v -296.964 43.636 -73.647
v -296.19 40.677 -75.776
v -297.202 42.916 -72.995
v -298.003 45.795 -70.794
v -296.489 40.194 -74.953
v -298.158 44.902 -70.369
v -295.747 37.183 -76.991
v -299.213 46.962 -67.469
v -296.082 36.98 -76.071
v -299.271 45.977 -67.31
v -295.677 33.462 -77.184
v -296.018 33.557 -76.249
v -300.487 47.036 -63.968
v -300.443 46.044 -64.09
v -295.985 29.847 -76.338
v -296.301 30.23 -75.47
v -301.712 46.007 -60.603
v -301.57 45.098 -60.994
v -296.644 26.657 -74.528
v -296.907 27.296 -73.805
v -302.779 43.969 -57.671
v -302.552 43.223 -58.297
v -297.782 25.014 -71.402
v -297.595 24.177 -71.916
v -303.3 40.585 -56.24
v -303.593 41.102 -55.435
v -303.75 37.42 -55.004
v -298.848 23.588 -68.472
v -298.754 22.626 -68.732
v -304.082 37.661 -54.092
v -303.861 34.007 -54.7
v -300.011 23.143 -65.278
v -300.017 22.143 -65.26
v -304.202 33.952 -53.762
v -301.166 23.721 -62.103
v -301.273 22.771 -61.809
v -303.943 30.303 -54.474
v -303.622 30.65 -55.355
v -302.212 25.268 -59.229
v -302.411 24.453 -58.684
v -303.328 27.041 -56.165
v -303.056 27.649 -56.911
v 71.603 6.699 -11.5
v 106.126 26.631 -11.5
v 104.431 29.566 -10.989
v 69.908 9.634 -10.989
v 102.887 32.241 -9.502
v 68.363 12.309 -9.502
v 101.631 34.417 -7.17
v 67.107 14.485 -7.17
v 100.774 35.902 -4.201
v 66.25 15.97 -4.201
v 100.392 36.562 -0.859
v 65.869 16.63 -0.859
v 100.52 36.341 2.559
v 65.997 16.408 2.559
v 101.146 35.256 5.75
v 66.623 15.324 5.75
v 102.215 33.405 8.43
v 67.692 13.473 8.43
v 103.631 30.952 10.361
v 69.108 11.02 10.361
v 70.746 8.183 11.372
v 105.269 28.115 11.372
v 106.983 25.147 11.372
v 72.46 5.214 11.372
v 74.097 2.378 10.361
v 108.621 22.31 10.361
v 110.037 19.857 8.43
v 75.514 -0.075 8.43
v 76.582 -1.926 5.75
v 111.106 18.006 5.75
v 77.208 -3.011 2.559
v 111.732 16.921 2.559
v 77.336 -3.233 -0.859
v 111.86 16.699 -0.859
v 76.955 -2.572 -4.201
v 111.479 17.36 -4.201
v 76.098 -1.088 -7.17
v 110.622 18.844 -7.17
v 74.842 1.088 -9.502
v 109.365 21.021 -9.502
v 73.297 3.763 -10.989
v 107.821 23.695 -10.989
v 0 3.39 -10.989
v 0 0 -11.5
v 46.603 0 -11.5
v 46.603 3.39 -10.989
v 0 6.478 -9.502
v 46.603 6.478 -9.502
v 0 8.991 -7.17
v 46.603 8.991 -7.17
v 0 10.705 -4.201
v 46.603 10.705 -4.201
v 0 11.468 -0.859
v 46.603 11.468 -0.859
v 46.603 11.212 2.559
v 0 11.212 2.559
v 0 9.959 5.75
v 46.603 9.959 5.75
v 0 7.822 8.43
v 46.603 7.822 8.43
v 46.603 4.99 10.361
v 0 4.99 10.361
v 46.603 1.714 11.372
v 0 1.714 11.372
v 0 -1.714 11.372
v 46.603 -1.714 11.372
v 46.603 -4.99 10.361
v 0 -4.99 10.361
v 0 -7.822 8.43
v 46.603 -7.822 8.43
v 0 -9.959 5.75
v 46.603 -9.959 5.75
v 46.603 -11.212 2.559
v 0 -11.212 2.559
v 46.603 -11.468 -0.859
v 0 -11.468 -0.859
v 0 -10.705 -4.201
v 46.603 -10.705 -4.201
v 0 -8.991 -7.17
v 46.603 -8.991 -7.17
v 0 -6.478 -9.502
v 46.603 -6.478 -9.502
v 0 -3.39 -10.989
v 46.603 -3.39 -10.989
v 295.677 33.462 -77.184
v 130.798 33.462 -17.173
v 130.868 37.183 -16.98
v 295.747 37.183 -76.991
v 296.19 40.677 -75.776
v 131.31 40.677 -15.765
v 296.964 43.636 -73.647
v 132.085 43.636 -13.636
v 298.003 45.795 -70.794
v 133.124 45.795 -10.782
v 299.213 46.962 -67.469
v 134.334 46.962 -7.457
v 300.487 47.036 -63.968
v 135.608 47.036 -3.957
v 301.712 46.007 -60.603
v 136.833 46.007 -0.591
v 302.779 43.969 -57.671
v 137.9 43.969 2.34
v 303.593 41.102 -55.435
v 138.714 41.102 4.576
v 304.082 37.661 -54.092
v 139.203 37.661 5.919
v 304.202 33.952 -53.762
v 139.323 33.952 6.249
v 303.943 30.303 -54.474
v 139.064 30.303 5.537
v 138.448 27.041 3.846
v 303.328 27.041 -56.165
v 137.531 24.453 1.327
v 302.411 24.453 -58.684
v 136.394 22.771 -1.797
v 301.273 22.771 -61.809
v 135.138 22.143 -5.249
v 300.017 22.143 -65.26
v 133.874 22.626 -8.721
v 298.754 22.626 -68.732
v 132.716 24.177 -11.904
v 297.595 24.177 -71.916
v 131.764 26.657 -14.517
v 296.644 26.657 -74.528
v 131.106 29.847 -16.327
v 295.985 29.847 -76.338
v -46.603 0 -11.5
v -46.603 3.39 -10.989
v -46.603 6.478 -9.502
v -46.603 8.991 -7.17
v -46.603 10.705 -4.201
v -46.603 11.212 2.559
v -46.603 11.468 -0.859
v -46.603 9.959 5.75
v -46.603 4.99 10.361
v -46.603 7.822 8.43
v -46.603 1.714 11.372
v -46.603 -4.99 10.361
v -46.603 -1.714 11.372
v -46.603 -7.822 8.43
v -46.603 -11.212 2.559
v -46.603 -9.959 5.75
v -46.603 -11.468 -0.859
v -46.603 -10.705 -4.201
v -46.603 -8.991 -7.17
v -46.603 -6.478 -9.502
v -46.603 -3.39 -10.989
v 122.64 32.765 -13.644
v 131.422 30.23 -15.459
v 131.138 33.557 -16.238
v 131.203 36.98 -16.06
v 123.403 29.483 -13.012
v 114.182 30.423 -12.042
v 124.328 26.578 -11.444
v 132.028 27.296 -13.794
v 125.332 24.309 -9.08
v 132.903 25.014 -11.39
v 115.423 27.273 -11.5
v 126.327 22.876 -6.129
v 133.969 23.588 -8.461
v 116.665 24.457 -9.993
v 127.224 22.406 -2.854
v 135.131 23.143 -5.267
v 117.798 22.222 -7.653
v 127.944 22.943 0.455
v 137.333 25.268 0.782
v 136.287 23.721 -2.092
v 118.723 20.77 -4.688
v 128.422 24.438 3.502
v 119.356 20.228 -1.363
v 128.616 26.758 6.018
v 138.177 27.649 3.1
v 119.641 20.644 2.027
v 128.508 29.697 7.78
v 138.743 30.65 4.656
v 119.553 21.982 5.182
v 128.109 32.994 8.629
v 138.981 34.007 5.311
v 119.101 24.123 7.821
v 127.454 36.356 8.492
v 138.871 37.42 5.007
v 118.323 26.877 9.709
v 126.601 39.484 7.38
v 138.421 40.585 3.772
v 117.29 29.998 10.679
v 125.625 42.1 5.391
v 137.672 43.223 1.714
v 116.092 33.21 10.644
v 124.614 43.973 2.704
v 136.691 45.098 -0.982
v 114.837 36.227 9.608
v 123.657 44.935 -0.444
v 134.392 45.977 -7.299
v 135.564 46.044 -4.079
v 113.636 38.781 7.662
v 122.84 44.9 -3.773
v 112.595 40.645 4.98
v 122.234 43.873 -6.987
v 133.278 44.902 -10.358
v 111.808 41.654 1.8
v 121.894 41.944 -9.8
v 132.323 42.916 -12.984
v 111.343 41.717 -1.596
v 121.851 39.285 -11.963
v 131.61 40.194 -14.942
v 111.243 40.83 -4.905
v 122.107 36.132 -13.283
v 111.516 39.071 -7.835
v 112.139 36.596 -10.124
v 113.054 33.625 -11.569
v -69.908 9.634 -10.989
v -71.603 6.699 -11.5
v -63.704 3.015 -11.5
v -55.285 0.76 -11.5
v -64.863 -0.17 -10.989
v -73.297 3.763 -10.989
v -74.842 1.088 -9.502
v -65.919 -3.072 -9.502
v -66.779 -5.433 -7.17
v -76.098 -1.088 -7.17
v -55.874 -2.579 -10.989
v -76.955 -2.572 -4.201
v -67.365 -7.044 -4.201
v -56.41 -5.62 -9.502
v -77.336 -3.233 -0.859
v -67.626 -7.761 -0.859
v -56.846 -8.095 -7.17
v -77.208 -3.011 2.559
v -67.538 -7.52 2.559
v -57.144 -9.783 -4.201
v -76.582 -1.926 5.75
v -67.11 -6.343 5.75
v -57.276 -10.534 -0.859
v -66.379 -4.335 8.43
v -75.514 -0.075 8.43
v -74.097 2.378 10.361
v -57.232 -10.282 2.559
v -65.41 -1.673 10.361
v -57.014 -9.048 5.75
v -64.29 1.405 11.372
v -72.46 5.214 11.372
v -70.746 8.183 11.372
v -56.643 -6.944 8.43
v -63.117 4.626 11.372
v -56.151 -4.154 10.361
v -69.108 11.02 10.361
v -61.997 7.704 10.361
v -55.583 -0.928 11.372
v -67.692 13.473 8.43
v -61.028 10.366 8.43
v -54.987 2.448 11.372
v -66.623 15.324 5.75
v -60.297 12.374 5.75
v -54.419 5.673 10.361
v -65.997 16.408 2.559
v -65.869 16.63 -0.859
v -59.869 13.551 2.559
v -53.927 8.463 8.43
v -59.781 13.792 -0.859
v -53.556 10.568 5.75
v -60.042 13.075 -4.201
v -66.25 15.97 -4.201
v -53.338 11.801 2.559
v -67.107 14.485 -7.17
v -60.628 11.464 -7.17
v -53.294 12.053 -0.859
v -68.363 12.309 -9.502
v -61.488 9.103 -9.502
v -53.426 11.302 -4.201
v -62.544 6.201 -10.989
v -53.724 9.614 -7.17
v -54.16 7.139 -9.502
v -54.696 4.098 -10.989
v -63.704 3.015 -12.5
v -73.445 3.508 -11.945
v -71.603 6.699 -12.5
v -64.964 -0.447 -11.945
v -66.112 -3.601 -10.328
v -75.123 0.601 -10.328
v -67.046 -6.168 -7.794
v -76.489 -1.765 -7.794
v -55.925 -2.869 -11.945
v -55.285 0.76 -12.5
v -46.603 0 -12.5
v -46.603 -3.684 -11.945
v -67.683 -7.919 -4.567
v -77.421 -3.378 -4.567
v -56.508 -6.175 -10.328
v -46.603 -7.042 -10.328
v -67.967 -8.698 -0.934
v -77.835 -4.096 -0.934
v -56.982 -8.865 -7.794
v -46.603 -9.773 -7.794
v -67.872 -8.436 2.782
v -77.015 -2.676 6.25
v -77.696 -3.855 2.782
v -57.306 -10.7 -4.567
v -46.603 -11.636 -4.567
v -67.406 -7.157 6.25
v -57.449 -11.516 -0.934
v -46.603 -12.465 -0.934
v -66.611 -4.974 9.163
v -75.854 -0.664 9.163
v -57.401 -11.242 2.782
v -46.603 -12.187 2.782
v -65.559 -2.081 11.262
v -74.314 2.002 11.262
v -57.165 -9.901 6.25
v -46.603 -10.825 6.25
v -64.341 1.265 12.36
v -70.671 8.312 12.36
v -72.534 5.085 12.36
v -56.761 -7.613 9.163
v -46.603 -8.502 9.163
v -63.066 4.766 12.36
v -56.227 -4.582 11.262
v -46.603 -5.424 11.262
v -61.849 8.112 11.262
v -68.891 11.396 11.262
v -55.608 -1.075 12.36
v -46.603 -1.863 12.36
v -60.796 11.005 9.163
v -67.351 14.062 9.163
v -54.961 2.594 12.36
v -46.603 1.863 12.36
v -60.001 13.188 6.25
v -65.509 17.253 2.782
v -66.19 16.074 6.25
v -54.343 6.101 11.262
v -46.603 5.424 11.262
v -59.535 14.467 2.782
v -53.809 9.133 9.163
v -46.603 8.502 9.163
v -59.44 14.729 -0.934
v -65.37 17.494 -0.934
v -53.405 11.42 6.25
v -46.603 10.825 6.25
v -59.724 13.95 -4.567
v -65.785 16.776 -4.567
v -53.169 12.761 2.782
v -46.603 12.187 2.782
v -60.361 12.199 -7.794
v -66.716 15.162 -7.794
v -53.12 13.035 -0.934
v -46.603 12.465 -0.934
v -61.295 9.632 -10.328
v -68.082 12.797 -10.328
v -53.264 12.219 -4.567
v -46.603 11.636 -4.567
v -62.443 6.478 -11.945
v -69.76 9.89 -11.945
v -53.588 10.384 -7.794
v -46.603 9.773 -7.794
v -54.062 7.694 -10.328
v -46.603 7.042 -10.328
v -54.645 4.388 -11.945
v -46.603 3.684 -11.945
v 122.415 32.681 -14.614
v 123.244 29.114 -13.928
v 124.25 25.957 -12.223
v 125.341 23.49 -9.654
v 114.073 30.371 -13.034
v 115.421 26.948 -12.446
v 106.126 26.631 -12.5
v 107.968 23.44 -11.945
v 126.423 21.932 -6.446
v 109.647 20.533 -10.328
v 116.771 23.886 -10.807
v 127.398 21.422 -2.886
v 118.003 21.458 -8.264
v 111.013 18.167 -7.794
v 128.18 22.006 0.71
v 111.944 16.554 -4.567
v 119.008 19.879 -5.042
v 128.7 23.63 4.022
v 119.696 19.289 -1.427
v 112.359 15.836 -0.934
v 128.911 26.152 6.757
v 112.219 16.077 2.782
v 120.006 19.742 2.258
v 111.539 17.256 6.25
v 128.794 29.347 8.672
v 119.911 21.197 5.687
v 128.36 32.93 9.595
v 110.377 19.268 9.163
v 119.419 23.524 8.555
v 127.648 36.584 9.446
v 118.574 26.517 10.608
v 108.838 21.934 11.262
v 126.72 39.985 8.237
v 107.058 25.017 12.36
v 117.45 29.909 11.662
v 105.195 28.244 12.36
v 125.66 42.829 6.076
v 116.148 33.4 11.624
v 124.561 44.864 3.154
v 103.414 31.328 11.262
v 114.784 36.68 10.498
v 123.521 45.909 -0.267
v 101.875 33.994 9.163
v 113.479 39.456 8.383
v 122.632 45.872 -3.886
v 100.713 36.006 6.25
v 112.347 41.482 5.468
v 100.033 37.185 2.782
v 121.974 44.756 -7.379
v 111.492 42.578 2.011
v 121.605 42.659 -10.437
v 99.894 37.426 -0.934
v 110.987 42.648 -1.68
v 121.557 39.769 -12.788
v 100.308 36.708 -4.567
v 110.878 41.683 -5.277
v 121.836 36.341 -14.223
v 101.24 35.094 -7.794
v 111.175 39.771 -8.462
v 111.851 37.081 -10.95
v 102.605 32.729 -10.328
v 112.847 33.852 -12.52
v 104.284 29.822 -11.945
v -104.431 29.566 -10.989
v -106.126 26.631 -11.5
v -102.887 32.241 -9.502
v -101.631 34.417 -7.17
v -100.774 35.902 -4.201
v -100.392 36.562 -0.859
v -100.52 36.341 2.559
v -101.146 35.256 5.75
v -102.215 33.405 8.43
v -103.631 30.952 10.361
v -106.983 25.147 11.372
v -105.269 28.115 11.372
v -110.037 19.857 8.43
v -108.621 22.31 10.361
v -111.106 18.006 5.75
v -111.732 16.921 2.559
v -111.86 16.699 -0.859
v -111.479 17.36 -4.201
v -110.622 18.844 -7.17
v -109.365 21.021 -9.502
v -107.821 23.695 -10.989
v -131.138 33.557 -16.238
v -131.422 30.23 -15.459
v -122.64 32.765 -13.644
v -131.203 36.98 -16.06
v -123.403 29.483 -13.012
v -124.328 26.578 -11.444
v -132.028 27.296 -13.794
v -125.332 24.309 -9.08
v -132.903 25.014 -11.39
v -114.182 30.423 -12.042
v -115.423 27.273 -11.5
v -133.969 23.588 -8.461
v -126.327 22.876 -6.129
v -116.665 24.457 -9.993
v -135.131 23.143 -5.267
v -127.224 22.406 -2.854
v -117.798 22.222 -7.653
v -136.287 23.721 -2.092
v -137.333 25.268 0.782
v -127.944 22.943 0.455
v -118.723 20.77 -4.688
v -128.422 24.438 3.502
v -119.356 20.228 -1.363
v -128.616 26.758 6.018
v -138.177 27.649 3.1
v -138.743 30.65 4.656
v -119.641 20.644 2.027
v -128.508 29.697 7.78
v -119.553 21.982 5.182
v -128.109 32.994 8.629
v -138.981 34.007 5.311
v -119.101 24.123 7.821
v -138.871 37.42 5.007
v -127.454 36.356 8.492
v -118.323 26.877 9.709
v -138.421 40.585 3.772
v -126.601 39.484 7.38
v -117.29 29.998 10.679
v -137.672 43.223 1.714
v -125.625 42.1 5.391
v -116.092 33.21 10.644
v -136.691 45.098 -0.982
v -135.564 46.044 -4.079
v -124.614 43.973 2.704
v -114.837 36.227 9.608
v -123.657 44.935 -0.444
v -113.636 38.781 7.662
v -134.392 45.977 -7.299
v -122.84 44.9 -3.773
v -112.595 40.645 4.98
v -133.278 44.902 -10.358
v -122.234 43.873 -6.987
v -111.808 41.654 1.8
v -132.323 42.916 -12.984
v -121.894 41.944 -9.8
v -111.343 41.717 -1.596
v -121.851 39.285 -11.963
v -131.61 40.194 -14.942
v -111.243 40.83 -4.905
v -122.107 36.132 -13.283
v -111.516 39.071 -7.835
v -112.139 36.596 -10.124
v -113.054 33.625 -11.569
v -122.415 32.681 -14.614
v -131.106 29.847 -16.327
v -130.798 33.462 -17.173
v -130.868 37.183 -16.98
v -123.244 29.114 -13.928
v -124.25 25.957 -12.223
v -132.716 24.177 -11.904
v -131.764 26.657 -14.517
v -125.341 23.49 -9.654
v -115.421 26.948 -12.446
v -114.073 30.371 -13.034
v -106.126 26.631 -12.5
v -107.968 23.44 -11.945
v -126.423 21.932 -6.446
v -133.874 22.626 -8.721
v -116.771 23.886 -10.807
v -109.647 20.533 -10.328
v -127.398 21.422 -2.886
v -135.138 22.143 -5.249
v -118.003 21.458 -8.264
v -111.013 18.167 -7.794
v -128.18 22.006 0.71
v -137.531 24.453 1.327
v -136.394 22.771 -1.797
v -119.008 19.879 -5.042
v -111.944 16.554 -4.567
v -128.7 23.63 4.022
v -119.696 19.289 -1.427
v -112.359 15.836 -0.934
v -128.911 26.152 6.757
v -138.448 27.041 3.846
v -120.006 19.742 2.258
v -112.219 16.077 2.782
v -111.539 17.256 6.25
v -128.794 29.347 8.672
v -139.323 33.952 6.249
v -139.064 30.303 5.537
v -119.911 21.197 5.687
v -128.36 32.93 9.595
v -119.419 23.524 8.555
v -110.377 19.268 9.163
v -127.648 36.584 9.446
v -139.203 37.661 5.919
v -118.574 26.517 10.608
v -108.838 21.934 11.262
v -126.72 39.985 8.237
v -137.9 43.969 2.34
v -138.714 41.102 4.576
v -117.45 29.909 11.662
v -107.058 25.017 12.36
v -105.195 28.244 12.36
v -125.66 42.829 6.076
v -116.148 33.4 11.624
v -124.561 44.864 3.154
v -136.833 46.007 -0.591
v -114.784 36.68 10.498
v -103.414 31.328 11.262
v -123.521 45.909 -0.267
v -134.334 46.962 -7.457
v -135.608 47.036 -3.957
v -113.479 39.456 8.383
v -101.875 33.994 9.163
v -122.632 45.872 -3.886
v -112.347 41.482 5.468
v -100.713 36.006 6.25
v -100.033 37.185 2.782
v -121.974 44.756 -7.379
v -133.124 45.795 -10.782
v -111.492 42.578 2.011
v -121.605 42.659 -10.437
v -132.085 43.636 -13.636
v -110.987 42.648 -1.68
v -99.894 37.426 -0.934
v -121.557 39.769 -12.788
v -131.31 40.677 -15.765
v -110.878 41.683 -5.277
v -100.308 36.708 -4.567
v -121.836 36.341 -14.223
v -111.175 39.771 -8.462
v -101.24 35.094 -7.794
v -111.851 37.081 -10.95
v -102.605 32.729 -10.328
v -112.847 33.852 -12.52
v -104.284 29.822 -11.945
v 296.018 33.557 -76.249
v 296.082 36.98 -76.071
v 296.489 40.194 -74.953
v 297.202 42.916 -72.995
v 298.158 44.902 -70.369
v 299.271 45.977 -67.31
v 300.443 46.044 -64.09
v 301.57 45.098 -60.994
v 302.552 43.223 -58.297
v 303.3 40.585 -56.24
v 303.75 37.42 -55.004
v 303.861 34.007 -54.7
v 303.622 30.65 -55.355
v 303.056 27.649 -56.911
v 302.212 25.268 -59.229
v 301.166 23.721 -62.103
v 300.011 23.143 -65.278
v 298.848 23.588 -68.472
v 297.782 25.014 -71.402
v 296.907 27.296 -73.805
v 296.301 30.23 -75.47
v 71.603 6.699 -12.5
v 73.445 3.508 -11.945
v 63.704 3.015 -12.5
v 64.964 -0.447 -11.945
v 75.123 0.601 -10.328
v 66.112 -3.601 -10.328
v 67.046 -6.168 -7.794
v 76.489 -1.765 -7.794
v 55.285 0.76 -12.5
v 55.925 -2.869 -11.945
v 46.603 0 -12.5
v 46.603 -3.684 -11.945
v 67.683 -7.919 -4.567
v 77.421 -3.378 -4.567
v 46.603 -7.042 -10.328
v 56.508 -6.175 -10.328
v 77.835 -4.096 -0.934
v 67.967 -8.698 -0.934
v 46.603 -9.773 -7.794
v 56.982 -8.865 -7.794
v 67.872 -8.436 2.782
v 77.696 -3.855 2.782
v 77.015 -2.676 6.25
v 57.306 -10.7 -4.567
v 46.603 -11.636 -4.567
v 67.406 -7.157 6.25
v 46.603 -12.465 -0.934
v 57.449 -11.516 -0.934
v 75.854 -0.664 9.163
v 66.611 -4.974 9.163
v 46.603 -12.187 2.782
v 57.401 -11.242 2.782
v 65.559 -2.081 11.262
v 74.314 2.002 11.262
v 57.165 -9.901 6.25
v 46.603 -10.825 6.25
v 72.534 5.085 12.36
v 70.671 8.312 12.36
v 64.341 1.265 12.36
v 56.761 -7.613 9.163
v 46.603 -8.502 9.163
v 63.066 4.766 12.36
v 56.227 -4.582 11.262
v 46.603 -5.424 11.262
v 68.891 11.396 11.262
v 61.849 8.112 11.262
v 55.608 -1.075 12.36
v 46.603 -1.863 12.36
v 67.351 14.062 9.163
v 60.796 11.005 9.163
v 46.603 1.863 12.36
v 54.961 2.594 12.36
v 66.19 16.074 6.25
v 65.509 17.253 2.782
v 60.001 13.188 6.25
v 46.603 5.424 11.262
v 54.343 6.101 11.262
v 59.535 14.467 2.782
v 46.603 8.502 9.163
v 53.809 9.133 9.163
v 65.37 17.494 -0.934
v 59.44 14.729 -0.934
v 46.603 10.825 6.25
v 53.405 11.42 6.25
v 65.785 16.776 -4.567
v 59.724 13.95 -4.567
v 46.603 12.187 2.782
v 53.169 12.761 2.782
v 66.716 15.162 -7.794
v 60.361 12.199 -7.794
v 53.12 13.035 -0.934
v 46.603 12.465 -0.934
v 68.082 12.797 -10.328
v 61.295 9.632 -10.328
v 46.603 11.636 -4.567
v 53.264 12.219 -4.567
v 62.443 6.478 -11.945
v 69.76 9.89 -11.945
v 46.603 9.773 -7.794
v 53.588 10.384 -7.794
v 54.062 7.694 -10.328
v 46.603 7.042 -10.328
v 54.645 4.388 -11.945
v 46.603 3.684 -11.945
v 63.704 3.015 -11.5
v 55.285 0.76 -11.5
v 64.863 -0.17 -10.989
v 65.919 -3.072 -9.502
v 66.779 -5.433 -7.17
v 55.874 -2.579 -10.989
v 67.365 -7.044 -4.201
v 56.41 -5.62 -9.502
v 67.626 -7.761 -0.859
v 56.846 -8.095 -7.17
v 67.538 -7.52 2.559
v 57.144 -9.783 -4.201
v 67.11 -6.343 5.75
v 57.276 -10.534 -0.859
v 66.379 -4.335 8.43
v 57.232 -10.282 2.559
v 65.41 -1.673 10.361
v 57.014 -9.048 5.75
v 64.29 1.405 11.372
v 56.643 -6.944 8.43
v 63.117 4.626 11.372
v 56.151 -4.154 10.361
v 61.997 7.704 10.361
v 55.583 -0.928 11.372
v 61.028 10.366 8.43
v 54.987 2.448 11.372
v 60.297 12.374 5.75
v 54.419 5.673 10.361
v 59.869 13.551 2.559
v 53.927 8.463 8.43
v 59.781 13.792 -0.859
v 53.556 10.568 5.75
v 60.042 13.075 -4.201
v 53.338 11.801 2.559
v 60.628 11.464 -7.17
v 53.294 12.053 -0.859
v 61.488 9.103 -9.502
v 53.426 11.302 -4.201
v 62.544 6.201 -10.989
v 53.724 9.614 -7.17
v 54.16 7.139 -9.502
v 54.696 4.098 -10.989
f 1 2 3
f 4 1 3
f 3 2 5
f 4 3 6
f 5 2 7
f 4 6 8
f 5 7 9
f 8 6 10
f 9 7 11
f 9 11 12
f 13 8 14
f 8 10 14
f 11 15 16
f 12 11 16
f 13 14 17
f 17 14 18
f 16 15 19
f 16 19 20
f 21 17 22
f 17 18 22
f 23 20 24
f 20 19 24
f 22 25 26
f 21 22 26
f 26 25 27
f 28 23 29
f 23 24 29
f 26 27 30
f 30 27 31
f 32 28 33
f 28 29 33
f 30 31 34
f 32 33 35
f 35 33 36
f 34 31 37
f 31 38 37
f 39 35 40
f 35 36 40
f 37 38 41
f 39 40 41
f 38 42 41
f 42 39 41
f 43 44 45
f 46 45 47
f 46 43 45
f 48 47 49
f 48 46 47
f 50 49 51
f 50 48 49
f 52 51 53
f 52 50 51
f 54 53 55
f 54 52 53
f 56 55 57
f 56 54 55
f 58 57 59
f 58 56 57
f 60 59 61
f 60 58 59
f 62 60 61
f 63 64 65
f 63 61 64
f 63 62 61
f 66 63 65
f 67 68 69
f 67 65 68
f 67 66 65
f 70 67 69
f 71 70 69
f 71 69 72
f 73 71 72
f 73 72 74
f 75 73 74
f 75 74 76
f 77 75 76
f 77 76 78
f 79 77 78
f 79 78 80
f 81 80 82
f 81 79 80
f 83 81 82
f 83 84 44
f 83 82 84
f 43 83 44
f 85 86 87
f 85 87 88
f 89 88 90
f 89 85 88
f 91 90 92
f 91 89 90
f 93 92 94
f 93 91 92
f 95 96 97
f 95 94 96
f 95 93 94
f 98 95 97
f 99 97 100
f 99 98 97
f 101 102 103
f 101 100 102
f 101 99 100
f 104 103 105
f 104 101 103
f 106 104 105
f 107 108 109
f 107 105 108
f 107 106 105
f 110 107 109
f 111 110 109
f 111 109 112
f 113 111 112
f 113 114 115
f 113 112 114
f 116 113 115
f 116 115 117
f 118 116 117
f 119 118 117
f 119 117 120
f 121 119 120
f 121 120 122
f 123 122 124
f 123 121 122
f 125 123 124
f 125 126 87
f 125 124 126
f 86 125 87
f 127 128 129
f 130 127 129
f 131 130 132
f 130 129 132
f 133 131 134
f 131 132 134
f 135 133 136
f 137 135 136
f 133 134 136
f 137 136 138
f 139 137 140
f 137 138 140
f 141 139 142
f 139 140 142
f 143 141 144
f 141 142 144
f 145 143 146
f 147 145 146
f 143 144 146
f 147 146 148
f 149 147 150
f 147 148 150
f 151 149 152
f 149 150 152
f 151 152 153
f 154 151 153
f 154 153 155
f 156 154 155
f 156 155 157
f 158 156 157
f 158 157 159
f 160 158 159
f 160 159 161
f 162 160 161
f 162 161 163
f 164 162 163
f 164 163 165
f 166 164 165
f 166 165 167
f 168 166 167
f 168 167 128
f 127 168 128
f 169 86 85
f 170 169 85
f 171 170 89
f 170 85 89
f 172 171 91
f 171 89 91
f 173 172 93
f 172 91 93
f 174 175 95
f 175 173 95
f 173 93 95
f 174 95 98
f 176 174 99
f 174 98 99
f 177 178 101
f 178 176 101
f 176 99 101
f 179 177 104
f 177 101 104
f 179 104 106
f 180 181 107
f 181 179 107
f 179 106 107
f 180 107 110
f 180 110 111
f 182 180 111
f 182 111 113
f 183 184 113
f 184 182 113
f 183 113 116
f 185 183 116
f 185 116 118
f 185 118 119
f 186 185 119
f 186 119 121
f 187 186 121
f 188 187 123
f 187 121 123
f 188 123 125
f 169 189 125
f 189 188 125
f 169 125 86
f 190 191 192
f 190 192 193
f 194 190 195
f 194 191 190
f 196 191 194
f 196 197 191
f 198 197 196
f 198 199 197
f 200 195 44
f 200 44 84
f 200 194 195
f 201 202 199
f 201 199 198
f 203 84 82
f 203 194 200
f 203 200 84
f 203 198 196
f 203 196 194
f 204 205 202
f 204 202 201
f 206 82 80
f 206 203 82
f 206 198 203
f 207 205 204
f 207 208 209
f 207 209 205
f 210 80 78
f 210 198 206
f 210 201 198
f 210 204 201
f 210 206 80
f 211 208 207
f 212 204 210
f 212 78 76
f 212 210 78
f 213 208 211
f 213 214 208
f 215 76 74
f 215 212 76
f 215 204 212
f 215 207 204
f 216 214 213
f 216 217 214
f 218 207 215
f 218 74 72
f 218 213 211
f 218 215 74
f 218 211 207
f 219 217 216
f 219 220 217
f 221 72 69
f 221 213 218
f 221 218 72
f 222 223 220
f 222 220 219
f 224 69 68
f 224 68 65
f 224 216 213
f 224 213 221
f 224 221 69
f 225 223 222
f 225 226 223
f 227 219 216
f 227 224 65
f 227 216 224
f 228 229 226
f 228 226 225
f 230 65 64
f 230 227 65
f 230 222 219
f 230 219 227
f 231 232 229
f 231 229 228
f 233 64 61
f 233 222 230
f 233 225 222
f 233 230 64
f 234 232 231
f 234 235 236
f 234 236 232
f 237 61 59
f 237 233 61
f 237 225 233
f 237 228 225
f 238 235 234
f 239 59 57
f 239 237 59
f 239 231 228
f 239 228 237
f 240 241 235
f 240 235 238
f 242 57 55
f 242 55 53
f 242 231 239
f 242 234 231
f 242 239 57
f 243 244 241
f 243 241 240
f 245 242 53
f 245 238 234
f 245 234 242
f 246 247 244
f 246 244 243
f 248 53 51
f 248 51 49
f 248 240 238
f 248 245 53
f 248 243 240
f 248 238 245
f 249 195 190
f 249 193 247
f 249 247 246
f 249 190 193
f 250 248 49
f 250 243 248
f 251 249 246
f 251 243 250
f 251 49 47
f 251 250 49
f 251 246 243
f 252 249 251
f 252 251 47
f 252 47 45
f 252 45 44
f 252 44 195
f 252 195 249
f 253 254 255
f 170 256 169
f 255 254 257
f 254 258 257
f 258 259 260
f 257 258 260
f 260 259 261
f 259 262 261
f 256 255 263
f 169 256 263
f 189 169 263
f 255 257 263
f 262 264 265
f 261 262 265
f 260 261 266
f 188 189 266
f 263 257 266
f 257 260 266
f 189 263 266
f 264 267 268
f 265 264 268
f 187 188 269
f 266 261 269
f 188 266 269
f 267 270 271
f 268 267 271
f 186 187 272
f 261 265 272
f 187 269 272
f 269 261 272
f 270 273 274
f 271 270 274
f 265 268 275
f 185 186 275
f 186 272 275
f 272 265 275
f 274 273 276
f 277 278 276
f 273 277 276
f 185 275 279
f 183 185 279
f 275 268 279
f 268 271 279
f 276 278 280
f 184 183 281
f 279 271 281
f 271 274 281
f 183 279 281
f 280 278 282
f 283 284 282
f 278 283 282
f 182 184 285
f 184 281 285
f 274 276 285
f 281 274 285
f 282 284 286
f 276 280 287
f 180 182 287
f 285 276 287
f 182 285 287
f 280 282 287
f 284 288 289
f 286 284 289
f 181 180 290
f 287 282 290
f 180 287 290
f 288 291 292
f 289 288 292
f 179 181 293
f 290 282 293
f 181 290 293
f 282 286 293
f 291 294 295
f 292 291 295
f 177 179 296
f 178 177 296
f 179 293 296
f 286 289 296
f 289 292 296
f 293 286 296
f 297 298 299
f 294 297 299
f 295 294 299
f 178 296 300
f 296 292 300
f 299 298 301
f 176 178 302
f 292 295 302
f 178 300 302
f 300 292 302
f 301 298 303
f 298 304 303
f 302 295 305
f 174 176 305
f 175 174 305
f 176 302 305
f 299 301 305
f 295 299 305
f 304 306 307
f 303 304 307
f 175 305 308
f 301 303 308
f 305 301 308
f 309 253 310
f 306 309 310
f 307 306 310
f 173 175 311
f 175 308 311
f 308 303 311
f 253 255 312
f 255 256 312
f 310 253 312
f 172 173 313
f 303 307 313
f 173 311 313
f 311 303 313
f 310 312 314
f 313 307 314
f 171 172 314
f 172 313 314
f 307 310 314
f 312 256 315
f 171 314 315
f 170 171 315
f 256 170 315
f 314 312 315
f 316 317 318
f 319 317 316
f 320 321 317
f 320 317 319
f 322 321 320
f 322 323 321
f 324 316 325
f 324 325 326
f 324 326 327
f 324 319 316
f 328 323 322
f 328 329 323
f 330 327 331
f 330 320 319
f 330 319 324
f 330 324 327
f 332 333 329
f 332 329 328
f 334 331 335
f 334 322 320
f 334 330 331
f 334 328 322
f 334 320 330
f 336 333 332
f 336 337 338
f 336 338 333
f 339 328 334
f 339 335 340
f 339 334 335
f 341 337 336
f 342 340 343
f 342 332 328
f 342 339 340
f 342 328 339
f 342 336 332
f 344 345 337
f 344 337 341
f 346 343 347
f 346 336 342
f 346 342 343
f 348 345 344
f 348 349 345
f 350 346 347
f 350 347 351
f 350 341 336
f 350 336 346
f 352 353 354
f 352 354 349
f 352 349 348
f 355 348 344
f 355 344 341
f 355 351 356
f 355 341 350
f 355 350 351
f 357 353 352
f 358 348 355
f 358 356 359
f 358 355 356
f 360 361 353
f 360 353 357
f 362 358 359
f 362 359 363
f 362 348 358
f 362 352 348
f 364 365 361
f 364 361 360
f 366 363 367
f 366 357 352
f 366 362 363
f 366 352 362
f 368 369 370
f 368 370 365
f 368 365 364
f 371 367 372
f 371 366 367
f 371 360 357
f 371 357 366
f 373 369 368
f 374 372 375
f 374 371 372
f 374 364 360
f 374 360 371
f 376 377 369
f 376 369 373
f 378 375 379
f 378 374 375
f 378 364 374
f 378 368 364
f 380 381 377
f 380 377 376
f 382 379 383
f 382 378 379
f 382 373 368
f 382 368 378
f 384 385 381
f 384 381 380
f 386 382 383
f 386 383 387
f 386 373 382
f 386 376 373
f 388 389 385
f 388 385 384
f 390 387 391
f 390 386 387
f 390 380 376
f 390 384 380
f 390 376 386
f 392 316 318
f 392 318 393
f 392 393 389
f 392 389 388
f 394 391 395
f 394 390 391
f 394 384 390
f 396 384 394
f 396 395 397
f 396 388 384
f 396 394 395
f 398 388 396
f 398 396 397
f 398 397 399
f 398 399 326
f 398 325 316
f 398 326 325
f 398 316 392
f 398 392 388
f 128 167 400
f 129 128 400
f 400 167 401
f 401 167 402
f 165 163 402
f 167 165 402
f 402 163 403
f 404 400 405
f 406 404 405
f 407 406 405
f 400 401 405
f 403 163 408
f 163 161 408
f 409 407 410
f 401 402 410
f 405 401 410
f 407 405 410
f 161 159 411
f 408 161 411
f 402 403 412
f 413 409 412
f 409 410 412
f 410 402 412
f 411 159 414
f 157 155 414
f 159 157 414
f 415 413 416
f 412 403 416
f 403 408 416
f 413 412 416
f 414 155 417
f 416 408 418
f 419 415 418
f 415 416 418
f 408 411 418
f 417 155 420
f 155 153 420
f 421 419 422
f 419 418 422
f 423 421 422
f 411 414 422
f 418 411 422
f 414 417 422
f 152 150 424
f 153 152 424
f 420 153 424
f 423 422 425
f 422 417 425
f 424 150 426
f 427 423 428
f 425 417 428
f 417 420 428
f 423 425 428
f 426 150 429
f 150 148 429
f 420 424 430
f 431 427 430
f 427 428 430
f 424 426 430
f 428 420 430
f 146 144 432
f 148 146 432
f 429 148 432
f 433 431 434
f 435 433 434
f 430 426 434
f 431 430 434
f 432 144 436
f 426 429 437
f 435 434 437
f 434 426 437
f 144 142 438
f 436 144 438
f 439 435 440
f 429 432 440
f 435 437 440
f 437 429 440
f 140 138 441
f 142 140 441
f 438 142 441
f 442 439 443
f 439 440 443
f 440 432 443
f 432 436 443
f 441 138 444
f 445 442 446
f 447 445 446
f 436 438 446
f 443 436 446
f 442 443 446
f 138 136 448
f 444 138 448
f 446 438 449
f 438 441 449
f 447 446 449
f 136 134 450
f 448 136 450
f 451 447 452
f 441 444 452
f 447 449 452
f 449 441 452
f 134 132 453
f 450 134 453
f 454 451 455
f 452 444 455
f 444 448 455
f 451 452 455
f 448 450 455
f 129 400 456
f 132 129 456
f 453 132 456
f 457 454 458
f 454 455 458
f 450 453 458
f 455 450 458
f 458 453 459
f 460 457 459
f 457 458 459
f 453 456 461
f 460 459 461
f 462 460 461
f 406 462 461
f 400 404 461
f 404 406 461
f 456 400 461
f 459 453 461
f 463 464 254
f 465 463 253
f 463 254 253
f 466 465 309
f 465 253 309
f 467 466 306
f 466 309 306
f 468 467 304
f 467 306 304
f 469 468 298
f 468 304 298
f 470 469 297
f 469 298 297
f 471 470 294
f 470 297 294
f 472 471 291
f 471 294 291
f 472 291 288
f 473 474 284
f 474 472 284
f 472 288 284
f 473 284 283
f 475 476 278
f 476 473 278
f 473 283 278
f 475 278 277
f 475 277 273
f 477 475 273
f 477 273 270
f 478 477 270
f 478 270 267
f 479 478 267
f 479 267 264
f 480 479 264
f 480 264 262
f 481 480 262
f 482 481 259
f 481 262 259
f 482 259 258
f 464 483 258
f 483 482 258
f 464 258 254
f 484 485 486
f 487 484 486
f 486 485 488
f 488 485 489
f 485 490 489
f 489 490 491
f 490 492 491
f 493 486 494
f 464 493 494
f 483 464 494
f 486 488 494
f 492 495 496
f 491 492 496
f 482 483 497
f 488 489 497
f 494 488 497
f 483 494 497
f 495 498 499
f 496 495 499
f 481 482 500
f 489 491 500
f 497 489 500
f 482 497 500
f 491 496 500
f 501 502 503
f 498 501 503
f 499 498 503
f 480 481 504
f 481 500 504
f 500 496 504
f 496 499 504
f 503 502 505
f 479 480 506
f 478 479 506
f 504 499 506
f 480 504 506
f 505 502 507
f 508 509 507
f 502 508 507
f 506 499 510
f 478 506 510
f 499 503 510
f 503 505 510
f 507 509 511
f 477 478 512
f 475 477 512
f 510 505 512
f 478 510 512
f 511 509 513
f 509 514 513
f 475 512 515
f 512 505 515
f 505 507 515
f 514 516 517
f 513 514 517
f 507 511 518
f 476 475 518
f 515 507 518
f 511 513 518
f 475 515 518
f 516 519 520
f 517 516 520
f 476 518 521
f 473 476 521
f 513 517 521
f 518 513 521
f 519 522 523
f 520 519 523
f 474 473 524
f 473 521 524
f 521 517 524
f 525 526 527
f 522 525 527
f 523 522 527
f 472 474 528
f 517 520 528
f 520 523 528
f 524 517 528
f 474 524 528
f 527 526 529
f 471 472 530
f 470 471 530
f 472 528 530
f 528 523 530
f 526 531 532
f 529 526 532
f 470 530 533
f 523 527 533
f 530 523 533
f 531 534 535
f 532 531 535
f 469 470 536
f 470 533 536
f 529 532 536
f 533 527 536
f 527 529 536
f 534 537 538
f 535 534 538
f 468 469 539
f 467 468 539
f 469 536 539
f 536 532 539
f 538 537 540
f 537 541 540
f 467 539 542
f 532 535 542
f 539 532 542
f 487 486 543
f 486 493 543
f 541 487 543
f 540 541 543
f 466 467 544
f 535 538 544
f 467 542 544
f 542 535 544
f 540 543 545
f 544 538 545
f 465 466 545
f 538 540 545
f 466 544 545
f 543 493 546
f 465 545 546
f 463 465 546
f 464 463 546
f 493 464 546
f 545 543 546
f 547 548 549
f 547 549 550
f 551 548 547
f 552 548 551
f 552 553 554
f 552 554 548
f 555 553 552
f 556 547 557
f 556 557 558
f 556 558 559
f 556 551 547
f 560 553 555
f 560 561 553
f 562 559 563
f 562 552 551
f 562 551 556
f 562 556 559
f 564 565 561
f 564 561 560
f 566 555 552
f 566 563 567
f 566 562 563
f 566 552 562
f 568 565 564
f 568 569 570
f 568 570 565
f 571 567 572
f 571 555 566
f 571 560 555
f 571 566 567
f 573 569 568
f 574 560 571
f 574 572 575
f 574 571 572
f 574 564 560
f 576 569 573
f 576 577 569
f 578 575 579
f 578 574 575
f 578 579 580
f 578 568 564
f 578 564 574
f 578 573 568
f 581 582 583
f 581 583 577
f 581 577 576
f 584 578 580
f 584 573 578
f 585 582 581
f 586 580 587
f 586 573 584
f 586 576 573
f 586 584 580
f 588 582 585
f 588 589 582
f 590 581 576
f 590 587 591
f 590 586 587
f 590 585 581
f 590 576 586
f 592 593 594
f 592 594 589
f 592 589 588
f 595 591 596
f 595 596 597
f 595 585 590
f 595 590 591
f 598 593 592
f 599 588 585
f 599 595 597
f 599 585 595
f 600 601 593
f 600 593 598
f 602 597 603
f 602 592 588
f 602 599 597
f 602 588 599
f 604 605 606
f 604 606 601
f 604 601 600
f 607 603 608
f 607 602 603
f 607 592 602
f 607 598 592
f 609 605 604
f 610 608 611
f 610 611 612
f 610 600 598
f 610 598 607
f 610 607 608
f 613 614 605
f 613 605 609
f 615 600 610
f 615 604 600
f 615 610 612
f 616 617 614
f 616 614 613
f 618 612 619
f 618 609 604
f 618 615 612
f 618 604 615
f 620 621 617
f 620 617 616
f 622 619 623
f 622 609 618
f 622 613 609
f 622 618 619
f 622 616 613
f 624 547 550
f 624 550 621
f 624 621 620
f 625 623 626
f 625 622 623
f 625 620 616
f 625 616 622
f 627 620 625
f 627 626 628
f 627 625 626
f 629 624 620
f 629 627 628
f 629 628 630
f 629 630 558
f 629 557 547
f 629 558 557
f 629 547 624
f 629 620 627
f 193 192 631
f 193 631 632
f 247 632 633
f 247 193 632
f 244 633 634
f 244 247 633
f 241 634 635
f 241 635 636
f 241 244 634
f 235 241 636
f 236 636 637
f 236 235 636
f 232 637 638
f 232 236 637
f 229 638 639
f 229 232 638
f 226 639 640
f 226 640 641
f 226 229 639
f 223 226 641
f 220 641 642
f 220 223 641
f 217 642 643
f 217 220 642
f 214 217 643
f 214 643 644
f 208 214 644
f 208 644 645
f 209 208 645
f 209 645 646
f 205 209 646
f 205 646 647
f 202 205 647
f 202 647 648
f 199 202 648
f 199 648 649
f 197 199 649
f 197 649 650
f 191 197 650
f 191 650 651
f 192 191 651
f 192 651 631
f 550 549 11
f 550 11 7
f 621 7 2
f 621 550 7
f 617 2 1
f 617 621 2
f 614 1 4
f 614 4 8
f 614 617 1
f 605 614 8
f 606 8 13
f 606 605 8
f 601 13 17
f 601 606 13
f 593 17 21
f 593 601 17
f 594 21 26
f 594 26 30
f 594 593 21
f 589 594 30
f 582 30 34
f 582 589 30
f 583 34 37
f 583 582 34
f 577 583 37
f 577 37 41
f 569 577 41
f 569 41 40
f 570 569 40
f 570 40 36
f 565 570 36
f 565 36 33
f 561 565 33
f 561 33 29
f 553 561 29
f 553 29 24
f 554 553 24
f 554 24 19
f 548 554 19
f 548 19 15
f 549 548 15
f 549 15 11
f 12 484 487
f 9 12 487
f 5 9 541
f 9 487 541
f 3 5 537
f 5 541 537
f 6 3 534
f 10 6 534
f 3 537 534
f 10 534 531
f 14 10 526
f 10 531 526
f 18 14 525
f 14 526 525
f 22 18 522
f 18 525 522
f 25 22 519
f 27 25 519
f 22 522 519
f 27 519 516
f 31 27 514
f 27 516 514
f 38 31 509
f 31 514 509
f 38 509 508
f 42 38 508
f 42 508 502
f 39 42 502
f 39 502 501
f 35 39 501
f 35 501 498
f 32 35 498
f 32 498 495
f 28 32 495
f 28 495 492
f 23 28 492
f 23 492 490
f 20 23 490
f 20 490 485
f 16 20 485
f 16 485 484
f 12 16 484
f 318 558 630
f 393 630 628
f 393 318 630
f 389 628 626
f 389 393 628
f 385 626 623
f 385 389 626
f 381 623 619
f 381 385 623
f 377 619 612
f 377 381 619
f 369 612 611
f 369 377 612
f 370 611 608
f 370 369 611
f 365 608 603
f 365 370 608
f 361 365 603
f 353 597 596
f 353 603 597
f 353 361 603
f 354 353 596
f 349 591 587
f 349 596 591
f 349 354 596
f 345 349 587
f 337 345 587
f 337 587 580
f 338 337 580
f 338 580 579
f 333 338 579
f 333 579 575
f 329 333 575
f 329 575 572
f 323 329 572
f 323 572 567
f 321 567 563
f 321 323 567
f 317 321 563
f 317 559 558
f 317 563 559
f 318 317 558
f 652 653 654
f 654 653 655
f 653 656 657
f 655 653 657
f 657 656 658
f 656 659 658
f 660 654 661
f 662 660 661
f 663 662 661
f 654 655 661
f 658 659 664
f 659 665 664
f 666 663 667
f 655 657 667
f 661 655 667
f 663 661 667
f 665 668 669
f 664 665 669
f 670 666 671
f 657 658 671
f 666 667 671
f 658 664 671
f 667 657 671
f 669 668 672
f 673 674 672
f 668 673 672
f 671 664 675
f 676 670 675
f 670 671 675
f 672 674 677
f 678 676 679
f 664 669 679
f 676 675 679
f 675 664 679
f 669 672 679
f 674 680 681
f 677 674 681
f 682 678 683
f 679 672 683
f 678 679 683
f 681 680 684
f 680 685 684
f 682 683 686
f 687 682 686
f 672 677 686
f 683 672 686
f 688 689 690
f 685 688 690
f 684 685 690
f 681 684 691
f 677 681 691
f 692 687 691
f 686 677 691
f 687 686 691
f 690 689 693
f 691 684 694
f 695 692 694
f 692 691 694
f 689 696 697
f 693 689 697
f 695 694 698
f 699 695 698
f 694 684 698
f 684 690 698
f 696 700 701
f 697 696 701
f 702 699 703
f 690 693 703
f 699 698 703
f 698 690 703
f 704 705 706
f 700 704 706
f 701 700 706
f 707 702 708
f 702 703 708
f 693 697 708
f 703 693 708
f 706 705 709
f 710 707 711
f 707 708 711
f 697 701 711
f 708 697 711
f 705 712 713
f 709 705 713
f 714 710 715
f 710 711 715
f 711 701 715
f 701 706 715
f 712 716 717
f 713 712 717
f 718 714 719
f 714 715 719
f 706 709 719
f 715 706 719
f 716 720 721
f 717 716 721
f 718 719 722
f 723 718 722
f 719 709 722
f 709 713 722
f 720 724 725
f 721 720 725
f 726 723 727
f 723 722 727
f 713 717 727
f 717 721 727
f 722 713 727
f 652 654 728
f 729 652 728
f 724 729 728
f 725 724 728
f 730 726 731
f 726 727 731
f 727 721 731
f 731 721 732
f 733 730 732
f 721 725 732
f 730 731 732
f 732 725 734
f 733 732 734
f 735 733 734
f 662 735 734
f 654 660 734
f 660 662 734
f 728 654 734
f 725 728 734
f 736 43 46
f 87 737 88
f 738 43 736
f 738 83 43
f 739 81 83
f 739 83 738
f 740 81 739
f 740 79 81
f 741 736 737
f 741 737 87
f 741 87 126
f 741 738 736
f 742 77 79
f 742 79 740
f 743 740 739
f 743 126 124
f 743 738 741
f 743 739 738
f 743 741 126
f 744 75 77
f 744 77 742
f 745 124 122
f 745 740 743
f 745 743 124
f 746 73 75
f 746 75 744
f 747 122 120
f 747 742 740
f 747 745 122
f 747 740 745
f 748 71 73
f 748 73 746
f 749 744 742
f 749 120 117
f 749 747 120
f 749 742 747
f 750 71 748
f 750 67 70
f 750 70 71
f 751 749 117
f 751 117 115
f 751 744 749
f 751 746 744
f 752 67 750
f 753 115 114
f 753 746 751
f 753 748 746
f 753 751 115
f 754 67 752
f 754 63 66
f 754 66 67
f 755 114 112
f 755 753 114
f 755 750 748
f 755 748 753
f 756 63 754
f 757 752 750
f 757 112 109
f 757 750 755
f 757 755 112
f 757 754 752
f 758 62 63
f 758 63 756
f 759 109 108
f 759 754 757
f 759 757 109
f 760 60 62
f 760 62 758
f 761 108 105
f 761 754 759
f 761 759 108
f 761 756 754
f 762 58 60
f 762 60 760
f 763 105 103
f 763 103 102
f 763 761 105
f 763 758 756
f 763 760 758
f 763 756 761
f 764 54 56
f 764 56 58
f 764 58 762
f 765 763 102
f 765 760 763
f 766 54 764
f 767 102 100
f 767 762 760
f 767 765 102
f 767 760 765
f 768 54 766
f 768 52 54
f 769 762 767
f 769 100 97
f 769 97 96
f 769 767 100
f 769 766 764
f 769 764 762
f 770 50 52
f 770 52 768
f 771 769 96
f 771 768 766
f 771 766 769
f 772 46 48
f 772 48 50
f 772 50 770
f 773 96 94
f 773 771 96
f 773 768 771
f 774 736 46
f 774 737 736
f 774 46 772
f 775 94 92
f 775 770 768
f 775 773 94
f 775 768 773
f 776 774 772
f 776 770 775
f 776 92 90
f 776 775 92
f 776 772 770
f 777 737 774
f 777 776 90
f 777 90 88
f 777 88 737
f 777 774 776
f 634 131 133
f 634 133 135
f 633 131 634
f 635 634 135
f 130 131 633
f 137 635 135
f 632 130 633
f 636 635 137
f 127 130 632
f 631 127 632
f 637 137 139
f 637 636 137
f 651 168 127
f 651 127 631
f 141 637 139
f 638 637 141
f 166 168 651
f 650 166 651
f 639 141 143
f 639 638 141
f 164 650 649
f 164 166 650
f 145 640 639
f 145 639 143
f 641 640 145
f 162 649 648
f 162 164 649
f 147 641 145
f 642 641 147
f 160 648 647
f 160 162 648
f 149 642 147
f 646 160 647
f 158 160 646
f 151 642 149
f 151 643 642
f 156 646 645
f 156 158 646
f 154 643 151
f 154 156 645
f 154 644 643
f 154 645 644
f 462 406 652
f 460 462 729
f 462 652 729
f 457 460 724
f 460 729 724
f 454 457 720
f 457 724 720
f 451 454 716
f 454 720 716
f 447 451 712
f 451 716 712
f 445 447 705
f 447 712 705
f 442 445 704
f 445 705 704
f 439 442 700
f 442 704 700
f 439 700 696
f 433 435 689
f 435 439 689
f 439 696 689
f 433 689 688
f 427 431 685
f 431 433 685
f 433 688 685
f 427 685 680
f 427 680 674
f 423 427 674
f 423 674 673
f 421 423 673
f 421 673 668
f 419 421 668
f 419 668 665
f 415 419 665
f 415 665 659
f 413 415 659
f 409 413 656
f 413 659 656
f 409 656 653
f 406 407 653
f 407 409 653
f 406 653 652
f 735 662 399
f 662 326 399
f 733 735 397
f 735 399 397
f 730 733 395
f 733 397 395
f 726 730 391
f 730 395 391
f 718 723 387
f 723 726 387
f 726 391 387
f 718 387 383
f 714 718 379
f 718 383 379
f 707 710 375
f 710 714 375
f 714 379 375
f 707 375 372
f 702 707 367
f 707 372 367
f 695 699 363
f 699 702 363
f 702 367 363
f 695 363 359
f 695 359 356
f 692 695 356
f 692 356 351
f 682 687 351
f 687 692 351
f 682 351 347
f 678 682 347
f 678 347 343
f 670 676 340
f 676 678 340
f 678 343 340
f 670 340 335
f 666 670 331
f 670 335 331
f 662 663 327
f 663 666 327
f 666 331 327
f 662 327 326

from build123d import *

# Parameters (mm, degrees)
ESQUISSE2_R   = 12.5
ESQUISSE2_R_2 = 11.5


with BuildPart() as part:
    # Balayage1: sweep along a curve in space
    with BuildLine() as balayage1_path:
        Line((-46.602540378, 0, 0), (0, 0, 0))
        ThreePointArc((-46.602540378, 0, 0), (-59.543492634, 1.703708686, 0), (-71.602540378, 6.698729811, 0))
        Line((-71.602540378, 6.698729811, 0), (-106.126093697, 26.630912613, 0))
        ThreePointArc((-106.126093697, 26.630912613, 0), (-120.302247758, 32.589576105, -1.403267638), (-135.054070374, 34.641016151, -5.479233521))
        Line((-135.054070374, 34.641016151, -5.479233521), (-299.933342618, 34.641016151, -65.490380865))
    # Esquisse2 → Balayage1 (sweep)
    with BuildSketch(Plane(origin=(0, 0, 0), x_dir=(0, 0, -1), z_dir=(1, 0, 0))):
        Circle(ESQUISSE2_R)
        Circle(ESQUISSE2_R_2, mode=Mode.SUBTRACT)
    balayage1 = sweep(path=balayage1_path.line)

    # Symétrie1: Balayage1 across plane
    add(balayage1.mirror(Plane(origin=(0, 0, 0), x_dir=(0, 0, 1), z_dir=(1, 0, 0))))


solid = part.part
